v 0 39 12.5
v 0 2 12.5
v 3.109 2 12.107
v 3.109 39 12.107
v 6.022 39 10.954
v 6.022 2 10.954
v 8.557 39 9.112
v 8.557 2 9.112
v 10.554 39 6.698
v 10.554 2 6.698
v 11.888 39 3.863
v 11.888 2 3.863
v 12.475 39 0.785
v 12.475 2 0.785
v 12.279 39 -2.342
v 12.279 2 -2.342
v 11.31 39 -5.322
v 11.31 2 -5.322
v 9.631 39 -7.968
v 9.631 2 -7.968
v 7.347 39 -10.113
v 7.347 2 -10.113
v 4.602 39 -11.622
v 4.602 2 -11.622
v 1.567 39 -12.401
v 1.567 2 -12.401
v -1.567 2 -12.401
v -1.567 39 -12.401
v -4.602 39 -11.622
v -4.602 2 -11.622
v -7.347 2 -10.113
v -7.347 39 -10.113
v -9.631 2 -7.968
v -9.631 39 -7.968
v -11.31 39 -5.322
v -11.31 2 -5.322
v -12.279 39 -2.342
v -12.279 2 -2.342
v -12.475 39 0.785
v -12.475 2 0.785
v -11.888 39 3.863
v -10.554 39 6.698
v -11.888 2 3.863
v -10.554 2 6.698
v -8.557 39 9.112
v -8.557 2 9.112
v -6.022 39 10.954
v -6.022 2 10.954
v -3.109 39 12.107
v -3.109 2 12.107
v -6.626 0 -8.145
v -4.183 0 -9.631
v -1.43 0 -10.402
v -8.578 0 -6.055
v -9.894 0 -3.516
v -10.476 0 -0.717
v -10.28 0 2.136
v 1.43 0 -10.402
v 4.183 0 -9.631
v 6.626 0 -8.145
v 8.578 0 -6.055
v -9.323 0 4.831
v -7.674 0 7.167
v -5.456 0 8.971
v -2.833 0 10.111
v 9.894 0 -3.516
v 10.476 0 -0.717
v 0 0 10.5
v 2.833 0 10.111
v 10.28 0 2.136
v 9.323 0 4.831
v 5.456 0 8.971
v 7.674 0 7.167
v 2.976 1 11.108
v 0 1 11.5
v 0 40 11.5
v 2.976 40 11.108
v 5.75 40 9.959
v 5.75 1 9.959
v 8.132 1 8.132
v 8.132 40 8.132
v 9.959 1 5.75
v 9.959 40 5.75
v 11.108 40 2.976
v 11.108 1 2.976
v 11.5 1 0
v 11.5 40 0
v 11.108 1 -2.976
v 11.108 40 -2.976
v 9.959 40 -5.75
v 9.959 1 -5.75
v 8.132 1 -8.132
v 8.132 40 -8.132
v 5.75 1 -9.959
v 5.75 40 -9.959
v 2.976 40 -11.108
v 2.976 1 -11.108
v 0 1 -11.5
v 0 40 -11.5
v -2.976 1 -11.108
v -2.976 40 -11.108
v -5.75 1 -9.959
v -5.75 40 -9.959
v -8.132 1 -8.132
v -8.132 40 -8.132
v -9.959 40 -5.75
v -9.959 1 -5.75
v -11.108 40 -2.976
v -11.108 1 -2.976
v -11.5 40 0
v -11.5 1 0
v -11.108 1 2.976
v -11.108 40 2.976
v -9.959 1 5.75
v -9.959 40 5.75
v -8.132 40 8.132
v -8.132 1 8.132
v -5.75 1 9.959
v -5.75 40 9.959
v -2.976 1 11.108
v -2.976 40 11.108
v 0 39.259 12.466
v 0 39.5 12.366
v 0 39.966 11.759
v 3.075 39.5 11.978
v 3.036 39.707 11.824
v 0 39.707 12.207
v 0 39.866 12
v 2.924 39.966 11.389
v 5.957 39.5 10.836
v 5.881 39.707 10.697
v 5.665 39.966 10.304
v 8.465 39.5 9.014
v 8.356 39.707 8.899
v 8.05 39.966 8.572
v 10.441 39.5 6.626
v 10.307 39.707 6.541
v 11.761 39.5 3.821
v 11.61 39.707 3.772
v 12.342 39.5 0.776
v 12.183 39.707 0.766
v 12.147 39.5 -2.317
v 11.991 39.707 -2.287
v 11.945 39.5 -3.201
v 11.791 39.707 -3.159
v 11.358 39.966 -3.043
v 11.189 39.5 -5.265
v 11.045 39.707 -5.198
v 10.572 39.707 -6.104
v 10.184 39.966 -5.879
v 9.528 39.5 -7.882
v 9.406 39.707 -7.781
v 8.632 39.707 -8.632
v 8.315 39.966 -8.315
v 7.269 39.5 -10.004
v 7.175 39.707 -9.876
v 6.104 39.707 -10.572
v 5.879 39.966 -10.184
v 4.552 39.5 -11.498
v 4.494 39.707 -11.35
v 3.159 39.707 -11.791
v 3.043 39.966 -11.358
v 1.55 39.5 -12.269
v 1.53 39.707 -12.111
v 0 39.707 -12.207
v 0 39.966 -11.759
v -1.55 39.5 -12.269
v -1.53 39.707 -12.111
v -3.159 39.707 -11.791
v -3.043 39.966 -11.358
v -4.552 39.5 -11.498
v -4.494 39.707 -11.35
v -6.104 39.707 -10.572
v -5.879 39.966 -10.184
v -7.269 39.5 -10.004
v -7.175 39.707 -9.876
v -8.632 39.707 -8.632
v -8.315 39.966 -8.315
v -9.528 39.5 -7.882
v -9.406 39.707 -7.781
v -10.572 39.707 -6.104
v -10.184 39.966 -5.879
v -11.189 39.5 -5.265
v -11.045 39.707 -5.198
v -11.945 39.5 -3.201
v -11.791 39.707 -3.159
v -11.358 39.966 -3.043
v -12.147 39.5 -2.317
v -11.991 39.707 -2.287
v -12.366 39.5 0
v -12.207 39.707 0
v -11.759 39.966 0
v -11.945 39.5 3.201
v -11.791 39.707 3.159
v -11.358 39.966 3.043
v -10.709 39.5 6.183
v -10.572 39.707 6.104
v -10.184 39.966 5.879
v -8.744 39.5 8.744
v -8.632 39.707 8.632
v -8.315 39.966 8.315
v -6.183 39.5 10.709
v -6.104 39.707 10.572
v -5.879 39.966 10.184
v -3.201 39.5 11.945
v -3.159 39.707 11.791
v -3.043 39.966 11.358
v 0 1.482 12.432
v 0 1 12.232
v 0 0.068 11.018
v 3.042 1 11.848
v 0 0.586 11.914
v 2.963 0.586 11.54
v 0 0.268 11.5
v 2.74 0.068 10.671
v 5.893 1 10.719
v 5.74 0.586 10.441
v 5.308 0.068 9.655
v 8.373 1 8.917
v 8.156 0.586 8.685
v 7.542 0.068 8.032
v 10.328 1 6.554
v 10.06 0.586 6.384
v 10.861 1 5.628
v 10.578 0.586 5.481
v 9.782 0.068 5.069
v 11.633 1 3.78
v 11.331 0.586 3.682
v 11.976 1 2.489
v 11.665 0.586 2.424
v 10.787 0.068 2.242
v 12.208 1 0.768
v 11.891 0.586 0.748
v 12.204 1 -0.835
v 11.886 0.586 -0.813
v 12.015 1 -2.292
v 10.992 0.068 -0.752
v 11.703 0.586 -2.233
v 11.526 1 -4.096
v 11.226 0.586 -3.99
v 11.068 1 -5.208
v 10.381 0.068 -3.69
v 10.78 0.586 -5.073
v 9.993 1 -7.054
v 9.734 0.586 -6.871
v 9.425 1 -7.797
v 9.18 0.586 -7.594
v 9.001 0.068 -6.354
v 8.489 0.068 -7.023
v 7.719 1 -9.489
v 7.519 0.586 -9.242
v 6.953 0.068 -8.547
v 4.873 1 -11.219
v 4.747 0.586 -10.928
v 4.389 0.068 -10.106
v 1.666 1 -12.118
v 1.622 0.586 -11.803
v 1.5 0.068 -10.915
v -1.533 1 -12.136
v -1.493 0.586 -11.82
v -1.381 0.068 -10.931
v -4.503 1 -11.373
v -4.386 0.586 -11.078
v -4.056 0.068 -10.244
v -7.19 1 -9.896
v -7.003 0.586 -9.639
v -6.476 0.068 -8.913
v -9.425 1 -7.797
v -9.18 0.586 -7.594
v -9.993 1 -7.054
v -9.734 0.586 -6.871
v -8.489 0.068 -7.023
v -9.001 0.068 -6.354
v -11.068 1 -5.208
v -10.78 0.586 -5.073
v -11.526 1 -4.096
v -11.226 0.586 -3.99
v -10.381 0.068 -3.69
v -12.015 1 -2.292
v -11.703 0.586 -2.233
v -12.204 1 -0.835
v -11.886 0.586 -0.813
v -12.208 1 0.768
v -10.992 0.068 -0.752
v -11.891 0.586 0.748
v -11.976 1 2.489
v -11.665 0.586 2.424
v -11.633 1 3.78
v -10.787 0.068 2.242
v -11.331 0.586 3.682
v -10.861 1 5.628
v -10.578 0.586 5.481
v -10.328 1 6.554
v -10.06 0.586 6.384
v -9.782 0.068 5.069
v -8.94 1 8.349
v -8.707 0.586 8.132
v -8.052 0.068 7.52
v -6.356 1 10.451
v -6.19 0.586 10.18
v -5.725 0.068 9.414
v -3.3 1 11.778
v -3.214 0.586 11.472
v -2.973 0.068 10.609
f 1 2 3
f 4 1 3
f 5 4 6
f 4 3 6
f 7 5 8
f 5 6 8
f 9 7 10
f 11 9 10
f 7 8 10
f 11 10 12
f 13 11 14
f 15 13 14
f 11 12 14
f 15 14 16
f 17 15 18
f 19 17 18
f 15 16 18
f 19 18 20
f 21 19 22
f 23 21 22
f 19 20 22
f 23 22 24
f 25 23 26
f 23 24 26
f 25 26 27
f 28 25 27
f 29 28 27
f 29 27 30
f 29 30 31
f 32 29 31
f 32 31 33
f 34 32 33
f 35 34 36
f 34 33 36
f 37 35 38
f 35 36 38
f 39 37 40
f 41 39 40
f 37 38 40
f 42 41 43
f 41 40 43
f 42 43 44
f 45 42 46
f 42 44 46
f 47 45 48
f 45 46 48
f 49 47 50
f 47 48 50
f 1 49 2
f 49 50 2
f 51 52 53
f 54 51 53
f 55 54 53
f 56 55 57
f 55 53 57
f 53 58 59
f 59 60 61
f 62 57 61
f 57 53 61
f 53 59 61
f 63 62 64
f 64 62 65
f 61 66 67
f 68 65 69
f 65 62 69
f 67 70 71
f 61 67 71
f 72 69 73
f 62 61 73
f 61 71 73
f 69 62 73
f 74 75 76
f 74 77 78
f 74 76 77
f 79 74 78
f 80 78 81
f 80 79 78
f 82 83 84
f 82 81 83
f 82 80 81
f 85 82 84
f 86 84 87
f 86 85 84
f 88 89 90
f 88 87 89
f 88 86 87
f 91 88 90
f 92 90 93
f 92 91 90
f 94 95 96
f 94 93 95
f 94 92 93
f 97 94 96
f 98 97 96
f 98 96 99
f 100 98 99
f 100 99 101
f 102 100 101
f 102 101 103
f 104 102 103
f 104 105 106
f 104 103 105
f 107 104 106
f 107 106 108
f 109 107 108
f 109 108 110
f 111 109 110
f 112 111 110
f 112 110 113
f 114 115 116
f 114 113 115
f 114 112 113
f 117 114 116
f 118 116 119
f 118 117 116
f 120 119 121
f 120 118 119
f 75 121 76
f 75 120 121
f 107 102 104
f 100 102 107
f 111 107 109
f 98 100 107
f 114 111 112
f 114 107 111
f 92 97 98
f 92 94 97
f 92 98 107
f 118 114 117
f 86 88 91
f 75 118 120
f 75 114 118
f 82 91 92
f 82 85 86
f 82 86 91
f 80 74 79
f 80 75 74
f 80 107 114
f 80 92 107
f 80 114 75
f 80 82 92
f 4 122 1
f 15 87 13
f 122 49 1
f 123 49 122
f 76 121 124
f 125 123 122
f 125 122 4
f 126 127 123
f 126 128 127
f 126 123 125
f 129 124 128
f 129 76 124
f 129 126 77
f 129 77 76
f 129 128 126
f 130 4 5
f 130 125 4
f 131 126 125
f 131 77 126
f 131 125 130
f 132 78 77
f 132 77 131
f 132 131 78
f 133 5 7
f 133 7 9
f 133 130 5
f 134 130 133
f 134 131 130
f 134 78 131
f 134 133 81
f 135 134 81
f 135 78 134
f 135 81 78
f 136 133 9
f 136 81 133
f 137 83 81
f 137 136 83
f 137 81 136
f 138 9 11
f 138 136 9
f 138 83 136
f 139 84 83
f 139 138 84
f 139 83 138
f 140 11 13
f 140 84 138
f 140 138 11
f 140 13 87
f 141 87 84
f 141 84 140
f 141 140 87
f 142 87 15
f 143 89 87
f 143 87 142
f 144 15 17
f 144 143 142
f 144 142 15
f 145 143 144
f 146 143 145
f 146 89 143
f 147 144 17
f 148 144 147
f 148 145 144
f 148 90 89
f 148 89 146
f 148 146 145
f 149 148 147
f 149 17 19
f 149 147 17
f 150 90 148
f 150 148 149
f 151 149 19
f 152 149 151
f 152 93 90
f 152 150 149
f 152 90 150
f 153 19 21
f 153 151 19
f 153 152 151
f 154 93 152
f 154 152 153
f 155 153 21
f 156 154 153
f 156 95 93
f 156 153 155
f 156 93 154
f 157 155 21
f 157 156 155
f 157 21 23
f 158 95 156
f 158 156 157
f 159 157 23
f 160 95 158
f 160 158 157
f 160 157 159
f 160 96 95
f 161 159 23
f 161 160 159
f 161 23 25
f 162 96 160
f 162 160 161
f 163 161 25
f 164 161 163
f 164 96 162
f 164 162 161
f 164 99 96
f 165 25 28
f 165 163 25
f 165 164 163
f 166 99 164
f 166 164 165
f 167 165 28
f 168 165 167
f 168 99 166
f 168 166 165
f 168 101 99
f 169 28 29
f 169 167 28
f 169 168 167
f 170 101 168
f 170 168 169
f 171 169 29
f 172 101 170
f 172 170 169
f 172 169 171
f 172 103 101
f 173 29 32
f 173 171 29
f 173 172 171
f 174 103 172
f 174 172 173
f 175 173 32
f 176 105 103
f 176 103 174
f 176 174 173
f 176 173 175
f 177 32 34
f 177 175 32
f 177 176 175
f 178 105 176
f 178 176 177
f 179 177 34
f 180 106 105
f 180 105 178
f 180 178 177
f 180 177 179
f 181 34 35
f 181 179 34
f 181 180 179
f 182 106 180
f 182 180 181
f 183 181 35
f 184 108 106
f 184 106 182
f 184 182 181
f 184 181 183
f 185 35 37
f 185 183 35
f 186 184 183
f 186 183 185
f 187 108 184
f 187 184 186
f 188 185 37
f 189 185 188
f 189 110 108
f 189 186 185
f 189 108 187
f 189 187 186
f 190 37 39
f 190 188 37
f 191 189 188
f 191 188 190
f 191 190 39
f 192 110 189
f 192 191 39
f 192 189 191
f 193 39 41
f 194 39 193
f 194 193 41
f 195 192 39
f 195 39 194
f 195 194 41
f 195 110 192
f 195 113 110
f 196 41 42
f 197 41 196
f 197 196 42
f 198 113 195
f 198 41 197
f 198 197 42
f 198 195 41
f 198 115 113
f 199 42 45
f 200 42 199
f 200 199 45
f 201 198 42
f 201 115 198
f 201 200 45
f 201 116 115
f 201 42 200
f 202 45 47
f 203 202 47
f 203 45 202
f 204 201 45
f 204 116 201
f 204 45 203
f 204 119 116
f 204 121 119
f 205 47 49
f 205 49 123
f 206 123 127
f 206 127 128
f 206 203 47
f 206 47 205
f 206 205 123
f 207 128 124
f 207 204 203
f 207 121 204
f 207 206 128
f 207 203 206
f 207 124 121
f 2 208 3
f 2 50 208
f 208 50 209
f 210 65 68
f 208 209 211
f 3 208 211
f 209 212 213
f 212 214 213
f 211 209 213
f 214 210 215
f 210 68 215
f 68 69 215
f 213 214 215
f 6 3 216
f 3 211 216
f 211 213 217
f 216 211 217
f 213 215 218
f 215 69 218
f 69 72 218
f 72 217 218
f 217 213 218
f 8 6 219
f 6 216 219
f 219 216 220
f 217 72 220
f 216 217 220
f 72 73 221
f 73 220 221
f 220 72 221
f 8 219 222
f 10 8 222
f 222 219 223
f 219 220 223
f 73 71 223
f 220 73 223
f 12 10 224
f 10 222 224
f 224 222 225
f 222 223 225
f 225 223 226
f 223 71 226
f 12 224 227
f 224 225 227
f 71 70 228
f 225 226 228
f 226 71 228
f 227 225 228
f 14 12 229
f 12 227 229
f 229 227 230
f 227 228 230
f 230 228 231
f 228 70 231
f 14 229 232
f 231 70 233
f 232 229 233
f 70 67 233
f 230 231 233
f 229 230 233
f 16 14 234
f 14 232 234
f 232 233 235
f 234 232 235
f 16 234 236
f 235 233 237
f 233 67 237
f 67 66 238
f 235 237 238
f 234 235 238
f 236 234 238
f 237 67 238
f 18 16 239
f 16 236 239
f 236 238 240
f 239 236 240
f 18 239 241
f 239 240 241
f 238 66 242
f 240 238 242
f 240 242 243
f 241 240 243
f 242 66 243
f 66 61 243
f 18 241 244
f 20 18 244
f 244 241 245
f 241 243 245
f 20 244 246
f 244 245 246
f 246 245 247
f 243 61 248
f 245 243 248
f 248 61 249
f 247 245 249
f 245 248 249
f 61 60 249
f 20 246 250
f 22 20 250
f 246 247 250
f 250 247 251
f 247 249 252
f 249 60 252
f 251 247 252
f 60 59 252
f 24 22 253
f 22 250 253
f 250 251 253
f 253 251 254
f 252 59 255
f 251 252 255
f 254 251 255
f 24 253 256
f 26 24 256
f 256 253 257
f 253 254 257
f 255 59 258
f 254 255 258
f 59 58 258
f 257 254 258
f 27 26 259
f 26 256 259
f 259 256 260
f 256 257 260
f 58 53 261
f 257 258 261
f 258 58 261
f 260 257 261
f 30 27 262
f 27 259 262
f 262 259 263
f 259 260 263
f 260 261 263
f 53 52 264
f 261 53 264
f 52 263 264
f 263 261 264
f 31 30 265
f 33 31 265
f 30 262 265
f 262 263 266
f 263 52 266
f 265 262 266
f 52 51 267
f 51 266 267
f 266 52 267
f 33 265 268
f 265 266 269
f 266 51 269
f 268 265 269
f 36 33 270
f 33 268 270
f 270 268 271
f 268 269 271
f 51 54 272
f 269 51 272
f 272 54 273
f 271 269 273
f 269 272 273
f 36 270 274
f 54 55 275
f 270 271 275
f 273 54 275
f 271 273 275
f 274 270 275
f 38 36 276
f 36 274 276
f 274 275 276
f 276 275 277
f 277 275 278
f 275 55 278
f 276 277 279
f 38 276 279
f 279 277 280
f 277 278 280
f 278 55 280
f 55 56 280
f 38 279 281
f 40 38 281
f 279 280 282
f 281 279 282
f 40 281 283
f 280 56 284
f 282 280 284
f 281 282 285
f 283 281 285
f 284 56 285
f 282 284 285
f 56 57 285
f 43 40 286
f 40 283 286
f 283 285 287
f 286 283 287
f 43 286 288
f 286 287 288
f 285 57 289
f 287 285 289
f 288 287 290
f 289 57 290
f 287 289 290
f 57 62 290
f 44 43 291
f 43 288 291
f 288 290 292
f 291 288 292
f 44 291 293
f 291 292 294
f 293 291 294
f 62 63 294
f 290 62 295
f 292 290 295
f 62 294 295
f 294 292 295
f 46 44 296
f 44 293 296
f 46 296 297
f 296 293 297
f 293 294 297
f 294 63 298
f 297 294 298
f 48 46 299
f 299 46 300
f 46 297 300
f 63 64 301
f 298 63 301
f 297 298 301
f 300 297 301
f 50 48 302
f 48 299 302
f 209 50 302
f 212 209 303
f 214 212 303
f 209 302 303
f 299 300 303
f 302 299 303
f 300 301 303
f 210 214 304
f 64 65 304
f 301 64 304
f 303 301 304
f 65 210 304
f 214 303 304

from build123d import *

# Parameters (mm, degrees)
SKETCH1_R           = 12.5
BOSS_EXTRUDE1_DEPTH = 40
SHELL1_T            = -1
FILLET1_R           = 2
FILLET7_R           = 1


with BuildPart() as part:
    # Sketch1 → Boss-Extrude1 (new body)
    with BuildSketch(Plane(origin=(0, 0, 0), x_dir=(1, 0, 0), z_dir=(0, 1, 0))):
        with Locations(Location((0, 0, 0), (0, 0, 270))):
            Circle(SKETCH1_R)
    extrude(amount=BOSS_EXTRUDE1_DEPTH)

    # Shell1
    shell1_openings = [part.faces().sort_by_distance(p)[0] for p in [
        (0, 40, 0),
    ]]
    offset(amount=SHELL1_T, openings=shell1_openings, kind=Kind.INTERSECTION)

    # Fillet1
    fillet1_edges = [part.edges().sort_by_distance(p)[0] for p in [
        (0, 0, -12.5),
    ]]
    fillet(fillet1_edges, radius=FILLET1_R)

    # Fillet7
    fillet7_edges = [part.edges().sort_by_distance(p)[0] for p in [
        (0, 40, -12.5),
    ]]
    fillet(fillet7_edges, radius=FILLET7_R - 0.0001)  # a hair under: the kernel refuses the full size


solid = part.part
